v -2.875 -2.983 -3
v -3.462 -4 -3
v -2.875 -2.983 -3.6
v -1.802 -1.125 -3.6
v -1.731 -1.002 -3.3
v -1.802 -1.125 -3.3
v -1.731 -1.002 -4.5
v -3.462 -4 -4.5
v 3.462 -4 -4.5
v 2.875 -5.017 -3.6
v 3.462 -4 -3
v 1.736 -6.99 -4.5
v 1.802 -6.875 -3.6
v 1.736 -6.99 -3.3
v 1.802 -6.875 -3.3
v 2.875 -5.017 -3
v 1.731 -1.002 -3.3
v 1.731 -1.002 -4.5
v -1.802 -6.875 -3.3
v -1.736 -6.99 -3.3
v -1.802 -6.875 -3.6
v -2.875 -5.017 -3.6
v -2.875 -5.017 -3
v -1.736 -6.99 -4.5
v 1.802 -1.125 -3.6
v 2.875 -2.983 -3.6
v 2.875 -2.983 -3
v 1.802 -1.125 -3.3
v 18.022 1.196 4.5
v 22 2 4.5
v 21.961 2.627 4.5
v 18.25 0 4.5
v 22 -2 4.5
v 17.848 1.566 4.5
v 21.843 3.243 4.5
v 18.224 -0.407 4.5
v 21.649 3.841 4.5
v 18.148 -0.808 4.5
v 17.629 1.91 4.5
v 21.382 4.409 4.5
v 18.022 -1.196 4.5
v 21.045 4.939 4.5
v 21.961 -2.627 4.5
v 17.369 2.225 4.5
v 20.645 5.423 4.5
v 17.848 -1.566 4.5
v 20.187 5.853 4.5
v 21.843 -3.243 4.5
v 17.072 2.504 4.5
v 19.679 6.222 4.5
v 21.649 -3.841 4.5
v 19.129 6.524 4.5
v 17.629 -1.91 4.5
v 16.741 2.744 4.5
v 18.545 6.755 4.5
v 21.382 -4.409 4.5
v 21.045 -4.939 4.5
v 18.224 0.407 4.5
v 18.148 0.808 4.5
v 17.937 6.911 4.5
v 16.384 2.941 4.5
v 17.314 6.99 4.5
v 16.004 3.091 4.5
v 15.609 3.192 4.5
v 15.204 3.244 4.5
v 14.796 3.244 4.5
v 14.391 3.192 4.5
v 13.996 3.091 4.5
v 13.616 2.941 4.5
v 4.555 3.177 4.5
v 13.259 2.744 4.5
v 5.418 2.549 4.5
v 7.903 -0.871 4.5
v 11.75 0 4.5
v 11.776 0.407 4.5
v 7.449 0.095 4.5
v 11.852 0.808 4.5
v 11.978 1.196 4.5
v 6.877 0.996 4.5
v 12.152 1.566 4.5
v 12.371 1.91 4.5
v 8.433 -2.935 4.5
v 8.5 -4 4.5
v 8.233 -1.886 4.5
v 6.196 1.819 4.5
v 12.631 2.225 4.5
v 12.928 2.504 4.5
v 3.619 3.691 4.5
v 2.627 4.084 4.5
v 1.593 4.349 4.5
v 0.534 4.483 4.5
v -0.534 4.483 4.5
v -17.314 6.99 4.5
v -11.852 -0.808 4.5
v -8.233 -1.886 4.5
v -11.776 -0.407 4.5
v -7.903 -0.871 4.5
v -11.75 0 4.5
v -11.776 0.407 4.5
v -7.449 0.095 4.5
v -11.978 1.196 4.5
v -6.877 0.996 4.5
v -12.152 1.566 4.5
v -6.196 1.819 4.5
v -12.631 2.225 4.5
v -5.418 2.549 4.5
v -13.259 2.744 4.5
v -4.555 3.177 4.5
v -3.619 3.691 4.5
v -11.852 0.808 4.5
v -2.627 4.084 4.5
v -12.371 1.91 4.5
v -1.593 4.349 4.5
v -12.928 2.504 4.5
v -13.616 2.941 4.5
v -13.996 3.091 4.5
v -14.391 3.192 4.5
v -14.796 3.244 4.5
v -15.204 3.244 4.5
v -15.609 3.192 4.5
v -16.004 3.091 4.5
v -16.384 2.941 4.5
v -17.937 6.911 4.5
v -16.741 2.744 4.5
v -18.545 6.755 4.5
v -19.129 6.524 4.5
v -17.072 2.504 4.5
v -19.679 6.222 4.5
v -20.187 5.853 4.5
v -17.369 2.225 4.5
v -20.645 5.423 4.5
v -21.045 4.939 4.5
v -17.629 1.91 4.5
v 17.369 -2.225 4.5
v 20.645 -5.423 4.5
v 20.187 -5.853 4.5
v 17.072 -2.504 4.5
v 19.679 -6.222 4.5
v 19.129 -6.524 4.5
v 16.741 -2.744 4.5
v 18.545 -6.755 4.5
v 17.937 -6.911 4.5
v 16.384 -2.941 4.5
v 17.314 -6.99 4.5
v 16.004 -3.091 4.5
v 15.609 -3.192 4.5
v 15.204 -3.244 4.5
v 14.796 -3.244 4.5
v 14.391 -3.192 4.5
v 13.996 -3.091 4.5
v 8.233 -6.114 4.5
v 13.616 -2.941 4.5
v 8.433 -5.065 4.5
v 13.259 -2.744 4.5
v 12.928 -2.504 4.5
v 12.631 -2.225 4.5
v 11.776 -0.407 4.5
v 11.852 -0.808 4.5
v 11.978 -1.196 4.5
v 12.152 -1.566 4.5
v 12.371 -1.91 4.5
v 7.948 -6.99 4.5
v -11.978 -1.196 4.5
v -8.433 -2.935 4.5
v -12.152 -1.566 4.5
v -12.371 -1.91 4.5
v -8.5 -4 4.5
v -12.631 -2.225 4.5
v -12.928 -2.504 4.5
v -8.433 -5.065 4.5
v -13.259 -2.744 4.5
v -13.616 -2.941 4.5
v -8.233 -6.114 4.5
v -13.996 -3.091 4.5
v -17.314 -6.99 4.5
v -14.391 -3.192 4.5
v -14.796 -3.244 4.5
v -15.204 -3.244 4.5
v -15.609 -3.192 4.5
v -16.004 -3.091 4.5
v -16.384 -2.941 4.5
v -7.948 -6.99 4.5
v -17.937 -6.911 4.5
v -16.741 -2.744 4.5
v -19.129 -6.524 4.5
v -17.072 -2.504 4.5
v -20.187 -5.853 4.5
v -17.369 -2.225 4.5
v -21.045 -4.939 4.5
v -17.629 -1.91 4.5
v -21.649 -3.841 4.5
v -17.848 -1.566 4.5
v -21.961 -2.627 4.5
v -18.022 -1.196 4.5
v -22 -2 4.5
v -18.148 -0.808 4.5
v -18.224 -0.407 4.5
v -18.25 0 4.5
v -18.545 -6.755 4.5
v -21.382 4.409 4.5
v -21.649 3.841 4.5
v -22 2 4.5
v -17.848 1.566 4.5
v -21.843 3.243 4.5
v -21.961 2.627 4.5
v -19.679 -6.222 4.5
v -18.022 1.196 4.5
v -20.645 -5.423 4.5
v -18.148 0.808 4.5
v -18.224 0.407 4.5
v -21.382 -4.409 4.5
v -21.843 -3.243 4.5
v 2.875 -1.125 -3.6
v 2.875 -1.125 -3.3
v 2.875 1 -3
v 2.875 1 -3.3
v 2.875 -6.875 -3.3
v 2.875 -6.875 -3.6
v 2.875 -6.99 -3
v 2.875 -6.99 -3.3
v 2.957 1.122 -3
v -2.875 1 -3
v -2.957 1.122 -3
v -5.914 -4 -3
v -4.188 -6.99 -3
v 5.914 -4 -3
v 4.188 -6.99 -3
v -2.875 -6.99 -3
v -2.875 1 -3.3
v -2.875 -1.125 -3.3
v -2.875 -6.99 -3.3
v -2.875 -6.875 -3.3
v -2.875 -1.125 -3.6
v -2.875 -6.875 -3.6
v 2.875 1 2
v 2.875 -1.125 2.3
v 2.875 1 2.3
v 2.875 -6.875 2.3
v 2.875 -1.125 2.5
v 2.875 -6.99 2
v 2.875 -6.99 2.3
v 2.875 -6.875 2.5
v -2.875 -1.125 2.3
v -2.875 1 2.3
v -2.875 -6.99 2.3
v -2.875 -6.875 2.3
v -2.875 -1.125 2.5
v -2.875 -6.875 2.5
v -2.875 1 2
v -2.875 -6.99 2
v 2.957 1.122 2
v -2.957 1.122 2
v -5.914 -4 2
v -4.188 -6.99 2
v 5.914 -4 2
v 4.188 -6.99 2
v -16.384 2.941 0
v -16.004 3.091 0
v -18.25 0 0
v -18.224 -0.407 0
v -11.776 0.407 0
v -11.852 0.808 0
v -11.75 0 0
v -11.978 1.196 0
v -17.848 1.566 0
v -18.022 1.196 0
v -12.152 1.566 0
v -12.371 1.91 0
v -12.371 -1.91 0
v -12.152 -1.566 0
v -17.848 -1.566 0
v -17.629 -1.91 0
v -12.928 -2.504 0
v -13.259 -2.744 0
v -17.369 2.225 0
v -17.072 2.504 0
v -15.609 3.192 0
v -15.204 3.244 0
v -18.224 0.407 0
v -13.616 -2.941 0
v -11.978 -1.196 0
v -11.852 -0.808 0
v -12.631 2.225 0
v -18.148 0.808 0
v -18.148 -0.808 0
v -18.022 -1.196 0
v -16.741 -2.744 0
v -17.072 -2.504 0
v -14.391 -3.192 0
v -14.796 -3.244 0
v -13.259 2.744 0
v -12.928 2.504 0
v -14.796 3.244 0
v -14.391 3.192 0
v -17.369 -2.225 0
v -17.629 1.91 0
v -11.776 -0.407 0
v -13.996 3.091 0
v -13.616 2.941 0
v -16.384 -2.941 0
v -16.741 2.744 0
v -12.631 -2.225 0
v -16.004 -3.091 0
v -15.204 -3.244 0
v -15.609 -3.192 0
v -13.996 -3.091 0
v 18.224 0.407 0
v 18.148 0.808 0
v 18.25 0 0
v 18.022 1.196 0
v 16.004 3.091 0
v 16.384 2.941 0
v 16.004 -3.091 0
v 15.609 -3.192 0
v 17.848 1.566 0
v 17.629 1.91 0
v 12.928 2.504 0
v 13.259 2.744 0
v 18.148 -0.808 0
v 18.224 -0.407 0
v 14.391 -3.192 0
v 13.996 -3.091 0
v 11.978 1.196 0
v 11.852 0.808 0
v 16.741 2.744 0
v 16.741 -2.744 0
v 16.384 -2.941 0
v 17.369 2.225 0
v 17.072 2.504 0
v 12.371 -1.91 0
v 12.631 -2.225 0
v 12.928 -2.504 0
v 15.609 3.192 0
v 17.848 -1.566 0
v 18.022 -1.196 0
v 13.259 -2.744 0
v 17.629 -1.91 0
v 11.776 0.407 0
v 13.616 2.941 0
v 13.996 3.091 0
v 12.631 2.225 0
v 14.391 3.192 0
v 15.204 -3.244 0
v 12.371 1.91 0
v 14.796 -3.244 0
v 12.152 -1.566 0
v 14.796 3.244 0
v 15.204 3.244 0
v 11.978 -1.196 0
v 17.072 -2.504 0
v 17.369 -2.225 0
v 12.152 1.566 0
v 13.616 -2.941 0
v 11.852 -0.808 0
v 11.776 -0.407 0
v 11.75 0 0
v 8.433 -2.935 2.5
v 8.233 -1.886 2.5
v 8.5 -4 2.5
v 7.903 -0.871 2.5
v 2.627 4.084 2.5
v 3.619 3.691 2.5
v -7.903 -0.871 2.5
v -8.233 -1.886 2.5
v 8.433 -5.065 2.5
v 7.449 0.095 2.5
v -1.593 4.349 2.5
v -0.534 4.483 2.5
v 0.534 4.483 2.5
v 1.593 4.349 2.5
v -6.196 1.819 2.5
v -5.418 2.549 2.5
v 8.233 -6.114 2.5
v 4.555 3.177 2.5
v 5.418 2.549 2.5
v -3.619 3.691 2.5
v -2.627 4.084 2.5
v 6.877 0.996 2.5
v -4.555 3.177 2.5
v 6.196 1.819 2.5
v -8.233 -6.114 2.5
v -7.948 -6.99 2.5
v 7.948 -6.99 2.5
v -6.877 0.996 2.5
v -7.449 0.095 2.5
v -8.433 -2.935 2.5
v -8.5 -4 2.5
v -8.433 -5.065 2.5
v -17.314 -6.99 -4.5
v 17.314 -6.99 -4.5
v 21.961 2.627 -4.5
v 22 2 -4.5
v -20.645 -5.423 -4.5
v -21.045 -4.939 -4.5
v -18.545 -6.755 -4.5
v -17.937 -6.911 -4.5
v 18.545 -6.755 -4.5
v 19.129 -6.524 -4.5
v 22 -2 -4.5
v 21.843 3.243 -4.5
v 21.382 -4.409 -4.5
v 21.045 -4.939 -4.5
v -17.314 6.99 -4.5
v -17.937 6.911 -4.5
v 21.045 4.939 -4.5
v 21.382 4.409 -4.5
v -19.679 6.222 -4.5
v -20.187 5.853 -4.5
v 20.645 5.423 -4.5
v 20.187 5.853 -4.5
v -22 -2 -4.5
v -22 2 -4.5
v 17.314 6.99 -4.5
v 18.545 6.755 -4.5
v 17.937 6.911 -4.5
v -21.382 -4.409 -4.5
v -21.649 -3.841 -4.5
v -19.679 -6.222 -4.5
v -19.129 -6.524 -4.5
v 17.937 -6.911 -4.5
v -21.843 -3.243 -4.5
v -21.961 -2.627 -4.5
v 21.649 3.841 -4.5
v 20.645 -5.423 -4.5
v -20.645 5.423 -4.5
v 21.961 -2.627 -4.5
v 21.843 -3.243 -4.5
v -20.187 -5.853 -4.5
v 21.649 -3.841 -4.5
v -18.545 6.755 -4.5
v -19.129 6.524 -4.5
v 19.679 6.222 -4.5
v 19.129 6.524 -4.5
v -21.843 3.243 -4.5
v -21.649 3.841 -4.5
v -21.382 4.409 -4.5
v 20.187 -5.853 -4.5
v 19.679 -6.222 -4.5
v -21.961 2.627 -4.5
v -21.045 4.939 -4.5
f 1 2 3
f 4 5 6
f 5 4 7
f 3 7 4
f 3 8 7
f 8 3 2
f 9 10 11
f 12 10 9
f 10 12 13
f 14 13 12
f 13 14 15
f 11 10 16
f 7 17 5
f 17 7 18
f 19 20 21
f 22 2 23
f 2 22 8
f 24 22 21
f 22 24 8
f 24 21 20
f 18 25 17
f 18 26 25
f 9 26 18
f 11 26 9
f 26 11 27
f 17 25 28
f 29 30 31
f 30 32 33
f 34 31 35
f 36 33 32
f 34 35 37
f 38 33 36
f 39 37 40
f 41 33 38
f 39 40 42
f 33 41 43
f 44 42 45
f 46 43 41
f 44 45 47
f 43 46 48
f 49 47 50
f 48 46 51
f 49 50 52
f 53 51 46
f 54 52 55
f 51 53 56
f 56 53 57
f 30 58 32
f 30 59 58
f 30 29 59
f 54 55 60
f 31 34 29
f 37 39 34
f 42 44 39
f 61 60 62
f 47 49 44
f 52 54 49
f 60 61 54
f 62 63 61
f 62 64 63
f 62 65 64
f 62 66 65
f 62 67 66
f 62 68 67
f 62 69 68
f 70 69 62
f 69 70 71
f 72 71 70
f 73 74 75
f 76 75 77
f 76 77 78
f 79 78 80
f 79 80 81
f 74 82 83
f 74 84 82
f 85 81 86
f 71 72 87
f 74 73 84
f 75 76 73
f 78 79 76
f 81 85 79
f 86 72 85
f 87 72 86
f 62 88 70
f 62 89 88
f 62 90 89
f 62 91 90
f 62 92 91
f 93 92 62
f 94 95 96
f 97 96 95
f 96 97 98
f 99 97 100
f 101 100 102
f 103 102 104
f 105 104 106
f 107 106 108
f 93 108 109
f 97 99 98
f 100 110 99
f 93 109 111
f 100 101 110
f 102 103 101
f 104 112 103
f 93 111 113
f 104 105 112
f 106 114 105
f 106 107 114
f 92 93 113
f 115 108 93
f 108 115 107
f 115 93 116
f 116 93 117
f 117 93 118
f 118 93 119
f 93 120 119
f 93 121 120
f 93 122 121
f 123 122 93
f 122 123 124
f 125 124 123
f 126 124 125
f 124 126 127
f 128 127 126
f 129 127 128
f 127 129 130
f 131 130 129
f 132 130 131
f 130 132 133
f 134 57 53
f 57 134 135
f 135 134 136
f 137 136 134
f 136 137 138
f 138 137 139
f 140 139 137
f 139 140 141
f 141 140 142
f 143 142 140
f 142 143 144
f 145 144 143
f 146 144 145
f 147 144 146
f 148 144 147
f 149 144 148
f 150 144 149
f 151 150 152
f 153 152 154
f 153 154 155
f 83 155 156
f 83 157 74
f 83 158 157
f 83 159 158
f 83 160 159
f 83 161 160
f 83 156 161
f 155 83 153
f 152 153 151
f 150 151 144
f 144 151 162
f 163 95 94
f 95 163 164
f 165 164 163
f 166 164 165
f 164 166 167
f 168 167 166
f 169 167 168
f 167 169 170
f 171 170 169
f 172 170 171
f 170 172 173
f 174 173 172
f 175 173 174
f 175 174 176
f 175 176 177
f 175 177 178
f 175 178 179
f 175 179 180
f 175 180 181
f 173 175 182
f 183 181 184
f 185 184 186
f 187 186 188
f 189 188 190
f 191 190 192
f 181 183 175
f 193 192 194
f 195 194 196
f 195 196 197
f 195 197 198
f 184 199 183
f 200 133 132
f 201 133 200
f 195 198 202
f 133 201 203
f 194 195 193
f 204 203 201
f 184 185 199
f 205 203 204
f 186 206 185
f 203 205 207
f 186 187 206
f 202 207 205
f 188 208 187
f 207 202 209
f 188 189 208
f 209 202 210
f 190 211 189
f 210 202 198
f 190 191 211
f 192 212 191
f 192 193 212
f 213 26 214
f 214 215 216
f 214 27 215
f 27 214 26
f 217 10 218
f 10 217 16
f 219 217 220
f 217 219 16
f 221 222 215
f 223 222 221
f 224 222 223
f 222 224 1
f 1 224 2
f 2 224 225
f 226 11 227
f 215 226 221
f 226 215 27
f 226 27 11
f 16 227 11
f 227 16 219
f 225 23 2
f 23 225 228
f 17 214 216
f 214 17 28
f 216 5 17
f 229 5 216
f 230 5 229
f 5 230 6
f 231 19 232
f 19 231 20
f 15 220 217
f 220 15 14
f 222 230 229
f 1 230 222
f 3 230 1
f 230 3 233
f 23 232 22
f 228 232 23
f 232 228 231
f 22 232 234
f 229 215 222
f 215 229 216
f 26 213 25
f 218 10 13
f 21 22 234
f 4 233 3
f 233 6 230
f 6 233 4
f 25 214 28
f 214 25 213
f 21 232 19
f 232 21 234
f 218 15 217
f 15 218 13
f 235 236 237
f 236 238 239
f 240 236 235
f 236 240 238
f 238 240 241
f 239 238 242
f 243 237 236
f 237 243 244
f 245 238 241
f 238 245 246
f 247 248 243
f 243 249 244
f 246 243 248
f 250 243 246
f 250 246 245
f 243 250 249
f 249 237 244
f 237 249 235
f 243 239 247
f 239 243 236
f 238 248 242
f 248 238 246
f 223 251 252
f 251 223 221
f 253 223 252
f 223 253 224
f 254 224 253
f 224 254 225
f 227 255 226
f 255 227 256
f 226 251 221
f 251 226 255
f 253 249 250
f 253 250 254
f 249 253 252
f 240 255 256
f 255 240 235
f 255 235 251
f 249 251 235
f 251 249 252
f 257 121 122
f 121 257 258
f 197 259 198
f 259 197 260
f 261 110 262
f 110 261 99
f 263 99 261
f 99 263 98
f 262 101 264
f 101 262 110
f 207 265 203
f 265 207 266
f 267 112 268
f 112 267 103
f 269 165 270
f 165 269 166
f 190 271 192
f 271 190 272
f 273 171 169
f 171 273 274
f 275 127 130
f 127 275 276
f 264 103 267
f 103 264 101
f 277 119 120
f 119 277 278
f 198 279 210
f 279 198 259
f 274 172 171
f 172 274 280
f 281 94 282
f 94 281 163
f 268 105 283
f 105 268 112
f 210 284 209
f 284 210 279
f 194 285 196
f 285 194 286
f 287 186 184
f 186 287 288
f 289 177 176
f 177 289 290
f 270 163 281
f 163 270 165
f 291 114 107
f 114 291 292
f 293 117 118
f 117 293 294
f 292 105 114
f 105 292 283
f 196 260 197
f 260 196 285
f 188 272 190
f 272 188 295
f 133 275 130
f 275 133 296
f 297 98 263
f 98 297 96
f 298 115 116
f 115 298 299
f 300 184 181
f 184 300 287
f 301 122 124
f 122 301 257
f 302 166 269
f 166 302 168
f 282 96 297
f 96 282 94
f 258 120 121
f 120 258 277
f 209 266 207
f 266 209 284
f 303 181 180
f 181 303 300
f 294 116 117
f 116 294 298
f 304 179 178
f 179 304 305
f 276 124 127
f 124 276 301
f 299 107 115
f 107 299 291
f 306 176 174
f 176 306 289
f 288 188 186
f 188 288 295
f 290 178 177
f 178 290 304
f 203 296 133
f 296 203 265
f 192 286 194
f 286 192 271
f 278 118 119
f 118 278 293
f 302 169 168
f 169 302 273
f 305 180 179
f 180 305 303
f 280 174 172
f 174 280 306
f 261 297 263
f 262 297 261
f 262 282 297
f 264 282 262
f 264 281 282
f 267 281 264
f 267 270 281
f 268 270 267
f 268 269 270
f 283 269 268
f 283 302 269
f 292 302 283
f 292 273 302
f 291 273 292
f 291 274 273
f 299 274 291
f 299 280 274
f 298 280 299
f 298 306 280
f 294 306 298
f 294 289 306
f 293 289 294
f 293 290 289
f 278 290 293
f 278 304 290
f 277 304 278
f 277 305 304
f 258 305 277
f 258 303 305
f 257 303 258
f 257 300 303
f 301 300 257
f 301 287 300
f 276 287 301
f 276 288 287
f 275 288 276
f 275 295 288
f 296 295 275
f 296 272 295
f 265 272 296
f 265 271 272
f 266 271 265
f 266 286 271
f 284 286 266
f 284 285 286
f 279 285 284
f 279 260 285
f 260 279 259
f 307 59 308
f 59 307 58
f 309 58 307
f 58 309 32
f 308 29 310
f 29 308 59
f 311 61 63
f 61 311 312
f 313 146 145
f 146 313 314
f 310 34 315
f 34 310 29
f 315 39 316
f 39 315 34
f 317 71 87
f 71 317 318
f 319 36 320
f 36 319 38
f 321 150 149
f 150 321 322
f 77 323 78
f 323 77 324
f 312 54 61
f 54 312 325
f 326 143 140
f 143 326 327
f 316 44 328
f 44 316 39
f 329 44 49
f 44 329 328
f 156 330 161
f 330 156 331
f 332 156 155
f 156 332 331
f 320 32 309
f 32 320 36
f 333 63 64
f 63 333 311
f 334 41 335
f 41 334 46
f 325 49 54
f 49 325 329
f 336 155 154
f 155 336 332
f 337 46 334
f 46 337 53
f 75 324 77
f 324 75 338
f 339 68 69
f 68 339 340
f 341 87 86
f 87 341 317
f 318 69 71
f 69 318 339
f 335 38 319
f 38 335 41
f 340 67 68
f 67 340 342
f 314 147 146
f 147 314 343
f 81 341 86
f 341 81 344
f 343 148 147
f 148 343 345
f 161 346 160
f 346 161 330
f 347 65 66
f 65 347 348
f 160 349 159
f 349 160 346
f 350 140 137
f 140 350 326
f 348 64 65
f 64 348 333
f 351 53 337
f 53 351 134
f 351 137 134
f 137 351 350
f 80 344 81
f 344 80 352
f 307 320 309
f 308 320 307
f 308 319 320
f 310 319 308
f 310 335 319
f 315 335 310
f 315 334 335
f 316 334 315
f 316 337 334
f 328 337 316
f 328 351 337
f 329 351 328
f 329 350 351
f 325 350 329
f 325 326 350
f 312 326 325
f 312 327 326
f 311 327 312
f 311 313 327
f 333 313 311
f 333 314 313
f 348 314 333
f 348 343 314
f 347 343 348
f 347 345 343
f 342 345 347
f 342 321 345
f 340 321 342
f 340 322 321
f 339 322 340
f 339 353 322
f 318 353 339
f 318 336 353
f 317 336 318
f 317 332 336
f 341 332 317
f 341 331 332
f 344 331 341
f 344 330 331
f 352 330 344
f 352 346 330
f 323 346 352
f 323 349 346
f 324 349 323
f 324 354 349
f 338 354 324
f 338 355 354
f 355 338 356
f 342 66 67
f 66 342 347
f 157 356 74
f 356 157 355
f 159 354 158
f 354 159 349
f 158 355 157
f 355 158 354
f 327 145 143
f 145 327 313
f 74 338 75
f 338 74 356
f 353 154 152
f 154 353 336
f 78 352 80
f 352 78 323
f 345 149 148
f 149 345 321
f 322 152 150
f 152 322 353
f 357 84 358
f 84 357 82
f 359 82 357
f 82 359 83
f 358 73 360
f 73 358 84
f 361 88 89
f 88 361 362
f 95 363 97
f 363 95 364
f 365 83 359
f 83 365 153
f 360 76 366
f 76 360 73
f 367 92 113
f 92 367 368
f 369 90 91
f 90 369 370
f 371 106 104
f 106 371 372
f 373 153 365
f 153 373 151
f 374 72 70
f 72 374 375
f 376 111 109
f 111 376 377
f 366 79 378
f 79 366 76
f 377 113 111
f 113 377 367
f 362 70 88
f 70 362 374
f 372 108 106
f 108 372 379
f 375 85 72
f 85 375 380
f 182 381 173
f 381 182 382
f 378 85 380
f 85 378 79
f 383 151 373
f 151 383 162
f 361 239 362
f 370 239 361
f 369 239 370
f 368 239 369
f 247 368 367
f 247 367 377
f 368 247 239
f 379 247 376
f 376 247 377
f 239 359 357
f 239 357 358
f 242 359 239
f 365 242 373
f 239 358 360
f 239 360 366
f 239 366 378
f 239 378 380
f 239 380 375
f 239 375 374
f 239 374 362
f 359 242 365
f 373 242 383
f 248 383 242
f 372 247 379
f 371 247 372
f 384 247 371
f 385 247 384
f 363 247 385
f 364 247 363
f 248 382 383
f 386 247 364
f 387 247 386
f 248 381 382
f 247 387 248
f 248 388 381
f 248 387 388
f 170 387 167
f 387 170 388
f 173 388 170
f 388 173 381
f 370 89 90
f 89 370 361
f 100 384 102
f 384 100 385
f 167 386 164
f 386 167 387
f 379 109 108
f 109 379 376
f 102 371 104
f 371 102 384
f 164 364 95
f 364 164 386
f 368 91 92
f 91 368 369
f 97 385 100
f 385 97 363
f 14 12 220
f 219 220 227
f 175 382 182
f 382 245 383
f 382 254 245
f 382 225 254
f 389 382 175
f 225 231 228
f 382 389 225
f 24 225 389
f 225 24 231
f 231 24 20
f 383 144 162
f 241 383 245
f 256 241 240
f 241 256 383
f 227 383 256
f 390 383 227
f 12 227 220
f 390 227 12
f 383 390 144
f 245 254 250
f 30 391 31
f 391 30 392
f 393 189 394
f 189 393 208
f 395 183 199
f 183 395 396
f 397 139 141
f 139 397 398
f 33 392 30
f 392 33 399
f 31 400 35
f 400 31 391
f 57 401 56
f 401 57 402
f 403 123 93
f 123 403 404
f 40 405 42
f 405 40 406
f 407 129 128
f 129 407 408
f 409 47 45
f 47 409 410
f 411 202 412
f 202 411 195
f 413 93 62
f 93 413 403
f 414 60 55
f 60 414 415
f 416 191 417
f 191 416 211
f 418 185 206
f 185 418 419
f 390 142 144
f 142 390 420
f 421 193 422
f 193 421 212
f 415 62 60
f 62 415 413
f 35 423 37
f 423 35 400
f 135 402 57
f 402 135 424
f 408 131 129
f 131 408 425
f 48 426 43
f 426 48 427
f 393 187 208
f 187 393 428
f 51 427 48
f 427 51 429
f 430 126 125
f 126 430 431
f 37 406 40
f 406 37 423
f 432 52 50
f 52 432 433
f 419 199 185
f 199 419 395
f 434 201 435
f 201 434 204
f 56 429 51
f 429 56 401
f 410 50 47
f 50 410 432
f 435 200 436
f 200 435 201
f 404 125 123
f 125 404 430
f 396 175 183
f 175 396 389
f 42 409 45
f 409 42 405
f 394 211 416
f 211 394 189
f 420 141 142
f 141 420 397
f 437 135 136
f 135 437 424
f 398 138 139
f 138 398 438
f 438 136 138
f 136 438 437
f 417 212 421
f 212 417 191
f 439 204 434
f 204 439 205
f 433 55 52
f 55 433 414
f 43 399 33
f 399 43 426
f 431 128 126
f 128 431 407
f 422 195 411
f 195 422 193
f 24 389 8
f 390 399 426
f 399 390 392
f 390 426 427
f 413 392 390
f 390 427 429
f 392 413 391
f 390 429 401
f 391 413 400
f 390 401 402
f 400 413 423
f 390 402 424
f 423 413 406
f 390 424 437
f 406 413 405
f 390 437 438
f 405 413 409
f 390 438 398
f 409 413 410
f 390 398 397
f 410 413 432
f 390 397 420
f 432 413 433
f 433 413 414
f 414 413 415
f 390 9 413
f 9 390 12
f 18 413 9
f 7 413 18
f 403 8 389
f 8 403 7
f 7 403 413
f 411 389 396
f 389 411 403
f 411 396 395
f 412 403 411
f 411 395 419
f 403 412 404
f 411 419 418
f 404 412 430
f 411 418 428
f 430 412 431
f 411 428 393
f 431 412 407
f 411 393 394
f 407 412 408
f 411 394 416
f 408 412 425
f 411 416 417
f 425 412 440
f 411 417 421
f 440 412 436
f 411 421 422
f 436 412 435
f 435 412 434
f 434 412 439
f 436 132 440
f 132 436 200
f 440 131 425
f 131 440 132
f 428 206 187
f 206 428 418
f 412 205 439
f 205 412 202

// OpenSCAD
$fn = 50;


difference() {
	union() {
		translate(v = [0, 0, -4.5000000000]) {
			hull() {
				translate(v = [-17.0000000000, 2.0000000000, 0]) {
					cylinder(h = 9, r = 5);
				}
				translate(v = [17.0000000000, 2.0000000000, 0]) {
					cylinder(h = 9, r = 5);
				}
				translate(v = [-17.0000000000, -2.0000000000, 0]) {
					cylinder(h = 9, r = 5);
				}
				translate(v = [17.0000000000, -2.0000000000, 0]) {
					cylinder(h = 9, r = 5);
				}
			}
		}
	}
	union() {
		translate(v = [0, -4, 4.5000000000]) {
			rotate(a = [0, 0, 0]) {
				difference() {
					union() {
						translate(v = [0, 0, -5.0000000000]) {
							rotate(a = [0, 0, 0]) {
								difference() {
									union() {
										translate(v = [-1.7500000000, -3.2500000000, -250.3000000000]) {
											cube(size = [3.5000000000, 6.5000000000, 0.3000000000]);
										}
										translate(v = [-1.7500000000, -1.7500000000, -250.6000000000]) {
											cube(size = [3.5000000000, 3.5000000000, 0.3000000000]);
										}
										translate(v = [-1.7500000000, -3.2500000000, 0]) {
											cube(size = [3.5000000000, 6.5000000000, 0.3000000000]);
										}
										translate(v = [-1.7500000000, -1.7500000000, 0.3000000000]) {
											cube(size = [3.5000000000, 3.5000000000, 0.3000000000]);
										}
										translate(v = [0, 0, -250]) {
											linear_extrude(height = 250) {
												polygon(points = [[3.4620000000, 0.0000000000], [1.7310000000, 2.9981799479], [-1.7310000000, 2.9981799479], [-3.4620000000, 0.0000000000], [-1.7310000000, -2.9981799479], [1.7310000000, -2.9981799479]]);
											}
										}
										translate(v = [-1.7500000000, -3.2500000000, -250.3000000000]) {
											cube(size = [3.5000000000, 6.5000000000, 0.3000000000]);
										}
										translate(v = [-1.7500000000, -1.7500000000, -250.6000000000]) {
											cube(size = [3.5000000000, 3.5000000000, 0.3000000000]);
										}
										translate(v = [-1.7500000000, -3.2500000000, 0]) {
											cube(size = [3.5000000000, 6.5000000000, 0.3000000000]);
										}
										translate(v = [-1.7500000000, -1.7500000000, 0.3000000000]) {
											cube(size = [3.5000000000, 3.5000000000, 0.3000000000]);
										}
										translate(v = [-1.7500000000, -3.2500000000, -250.3000000000]) {
											cube(size = [3.5000000000, 6.5000000000, 0.3000000000]);
										}
										translate(v = [-1.7500000000, -1.7500000000, -250.6000000000]) {
											cube(size = [3.5000000000, 3.5000000000, 0.3000000000]);
										}
										translate(v = [-1.7500000000, -3.2500000000, 0]) {
											cube(size = [3.5000000000, 6.5000000000, 0.3000000000]);
										}
										translate(v = [-1.7500000000, -1.7500000000, 0.3000000000]) {
											cube(size = [3.5000000000, 3.5000000000, 0.3000000000]);
										}
									}
									union();
								}
							}
						}
						translate(v = [0, 0, -4.5000000000]) {
							rotate(a = [0, 0, 0]) {
								difference() {
									union() {
										translate(v = [-1.7500000000, -3.2500000000, -250.3000000000]) {
											cube(size = [3.5000000000, 6.5000000000, 0.3000000000]);
										}
										translate(v = [-1.7500000000, -1.7500000000, -250.6000000000]) {
											cube(size = [3.5000000000, 3.5000000000, 0.3000000000]);
										}
										translate(v = [-1.7500000000, -3.2500000000, 0]) {
											cube(size = [3.5000000000, 6.5000000000, 0.3000000000]);
										}
										translate(v = [-1.7500000000, -1.7500000000, 0.3000000000]) {
											cube(size = [3.5000000000, 3.5000000000, 0.3000000000]);
										}
										translate(v = [0, 0, -250]) {
											linear_extrude(height = 250) {
												polygon(points = [[3.4620000000, 0.0000000000], [1.7310000000, 2.9981799479], [-1.7310000000, 2.9981799479], [-3.4620000000, 0.0000000000], [-1.7310000000, -2.9981799479], [1.7310000000, -2.9981799479]]);
											}
										}
										translate(v = [-1.7500000000, -3.2500000000, -250.3000000000]) {
											cube(size = [3.5000000000, 6.5000000000, 0.3000000000]);
										}
										translate(v = [-1.7500000000, -1.7500000000, -250.6000000000]) {
											cube(size = [3.5000000000, 3.5000000000, 0.3000000000]);
										}
										translate(v = [-1.7500000000, -3.2500000000, 0]) {
											cube(size = [3.5000000000, 6.5000000000, 0.3000000000]);
										}
										translate(v = [-1.7500000000, -1.7500000000, 0.3000000000]) {
											cube(size = [3.5000000000, 3.5000000000, 0.3000000000]);
										}
										translate(v = [-1.7500000000, -3.2500000000, -250.3000000000]) {
											cube(size = [3.5000000000, 6.5000000000, 0.3000000000]);
										}
										translate(v = [-1.7500000000, -1.7500000000, -250.6000000000]) {
											cube(size = [3.5000000000, 3.5000000000, 0.3000000000]);
										}
										translate(v = [-1.7500000000, -3.2500000000, 0]) {
											cube(size = [3.5000000000, 6.5000000000, 0.3000000000]);
										}
										translate(v = [-1.7500000000, -1.7500000000, 0.3000000000]) {
											cube(size = [3.5000000000, 3.5000000000, 0.3000000000]);
										}
									}
									union();
								}
							}
						}
						translate(v = [0, 0, -5.0000000000]) {
							rotate(a = [0, 0, 0]) {
								difference() {
									union() {
										translate(v = [-1.7500000000, -3.2500000000, -250.3000000000]) {
											cube(size = [3.5000000000, 6.5000000000, 0.3000000000]);
										}
										translate(v = [-1.7500000000, -1.7500000000, -250.6000000000]) {
											cube(size = [3.5000000000, 3.5000000000, 0.3000000000]);
										}
										translate(v = [-1.7500000000, -3.2500000000, 0]) {
											cube(size = [3.5000000000, 6.5000000000, 0.3000000000]);
										}
										translate(v = [-1.7500000000, -1.7500000000, 0.3000000000]) {
											cube(size = [3.5000000000, 3.5000000000, 0.3000000000]);
										}
										translate(v = [0, 0, -250]) {
											linear_extrude(height = 250) {
												polygon(points = [[3.4620000000, 0.0000000000], [1.7310000000, 2.9981799479], [-1.7310000000, 2.9981799479], [-3.4620000000, 0.0000000000], [-1.7310000000, -2.9981799479], [1.7310000000, -2.9981799479]]);
											}
										}
										translate(v = [-1.7500000000, -3.2500000000, -250.3000000000]) {
											cube(size = [3.5000000000, 6.5000000000, 0.3000000000]);
										}
										translate(v = [-1.7500000000, -1.7500000000, -250.6000000000]) {
											cube(size = [3.5000000000, 3.5000000000, 0.3000000000]);
										}
										translate(v = [-1.7500000000, -3.2500000000, 0]) {
											cube(size = [3.5000000000, 6.5000000000, 0.3000000000]);
										}
										translate(v = [-1.7500000000, -1.7500000000, 0.3000000000]) {
											cube(size = [3.5000000000, 3.5000000000, 0.3000000000]);
										}
										translate(v = [-1.7500000000, -3.2500000000, -250.3000000000]) {
											cube(size = [3.5000000000, 6.5000000000, 0.3000000000]);
										}
										translate(v = [-1.7500000000, -1.7500000000, -250.6000000000]) {
											cube(size = [3.5000000000, 3.5000000000, 0.3000000000]);
										}
										translate(v = [-1.7500000000, -3.2500000000, 0]) {
											cube(size = [3.5000000000, 6.5000000000, 0.3000000000]);
										}
										translate(v = [-1.7500000000, -1.7500000000, 0.3000000000]) {
											cube(size = [3.5000000000, 3.5000000000, 0.3000000000]);
										}
									}
									union();
								}
							}
						}
						translate(v = [0, 0, -7.5000000000]) {
							cylinder(h = 7.5000000000, r = 1.5000000000);
						}
						translate(v = [0, 0, -1.9000000000]) {
							cylinder(h = 1.9000000000, r1 = 1.8000000000, r2 = 3.6000000000);
						}
						translate(v = [0, 0, -7.5000000000]) {
							cylinder(h = 7.5000000000, r = 1.8000000000);
						}
						translate(v = [0, 0, -7.5000000000]) {
							cylinder(h = 7.5000000000, r = 1.5000000000);
						}
					}
					union();
				}
			}
		}
		translate(v = [0, -4, -3.0000000000]) {
			rotate(a = [0, 0, 0]) {
				difference() {
					union() {
						#translate(v = [-2.8750000000, -5.0000000000, -0.3000000000]) {
							cube(size = [5.7500000000, 10, 0.3000000000]);
						}
						#translate(v = [-2.8750000000, -2.8750000000, -0.6000000000]) {
							cube(size = [5.7500000000, 5.7500000000, 0.3000000000]);
						}
						#translate(v = [-2.8750000000, -5.0000000000, 5]) {
							cube(size = [5.7500000000, 10, 0.3000000000]);
						}
						#translate(v = [-2.8750000000, -2.8750000000, 5.3000000000]) {
							cube(size = [5.7500000000, 5.7500000000, 0.3000000000]);
						}
						#linear_extrude(height = 5) {
							polygon(points = [[5.9142500000, 0.0000000000], [2.9571250000, 5.1218907443], [-2.9571250000, 5.1218907443], [-5.9142500000, 0.0000000000], [-2.9571250000, -5.1218907443], [2.9571250000, -5.1218907443]]);
						}
						#translate(v = [-2.8750000000, -5.0000000000, -0.3000000000]) {
							cube(size = [5.7500000000, 10, 0.3000000000]);
						}
						#translate(v = [-2.8750000000, -2.8750000000, -0.6000000000]) {
							cube(size = [5.7500000000, 5.7500000000, 0.3000000000]);
						}
						#translate(v = [-2.8750000000, -5.0000000000, 5]) {
							cube(size = [5.7500000000, 10, 0.3000000000]);
						}
						#translate(v = [-2.8750000000, -2.8750000000, 5.3000000000]) {
							cube(size = [5.7500000000, 5.7500000000, 0.3000000000]);
						}
						#translate(v = [-2.8750000000, -5.0000000000, -0.3000000000]) {
							cube(size = [5.7500000000, 10, 0.3000000000]);
						}
						#translate(v = [-2.8750000000, -2.8750000000, -0.6000000000]) {
							cube(size = [5.7500000000, 5.7500000000, 0.3000000000]);
						}
						#translate(v = [-2.8750000000, -5.0000000000, 5]) {
							cube(size = [5.7500000000, 10, 0.3000000000]);
						}
						#translate(v = [-2.8750000000, -2.8750000000, 5.3000000000]) {
							cube(size = [5.7500000000, 5.7500000000, 0.3000000000]);
						}
					}
					union();
				}
			}
		}
		translate(v = [-15.0000000000, 0.0000000000, 0]) {
			cylinder(h = 9, r = 3.2500000000);
		}
		translate(v = [15.0000000000, 0.0000000000, 0]) {
			cylinder(h = 9, r = 3.2500000000);
		}
		translate(v = [-15.0000000000, 0.0000000000, 0]) {
			cylinder(h = 9, r = 1.8000000000);
		}
		translate(v = [15.0000000000, 0.0000000000, 0]) {
			cylinder(h = 9, r = 1.8000000000);
		}
		translate(v = [-15.0000000000, 0.0000000000, 0]) {
			cylinder(h = 9, r = 1.8000000000);
		}
		translate(v = [15.0000000000, 0.0000000000, 0]) {
			cylinder(h = 9, r = 1.8000000000);
		}
		translate(v = [-15.0000000000, 0.0000000000, 0]) {
			cylinder(h = 9, r = 1.8000000000);
		}
		translate(v = [15.0000000000, 0.0000000000, 0]) {
			cylinder(h = 9, r = 1.8000000000);
		}
		translate(v = [0, -4, 2.5000000000]) {
			cylinder(h = 2, r = 8.5000000000);
		}
	}
}
